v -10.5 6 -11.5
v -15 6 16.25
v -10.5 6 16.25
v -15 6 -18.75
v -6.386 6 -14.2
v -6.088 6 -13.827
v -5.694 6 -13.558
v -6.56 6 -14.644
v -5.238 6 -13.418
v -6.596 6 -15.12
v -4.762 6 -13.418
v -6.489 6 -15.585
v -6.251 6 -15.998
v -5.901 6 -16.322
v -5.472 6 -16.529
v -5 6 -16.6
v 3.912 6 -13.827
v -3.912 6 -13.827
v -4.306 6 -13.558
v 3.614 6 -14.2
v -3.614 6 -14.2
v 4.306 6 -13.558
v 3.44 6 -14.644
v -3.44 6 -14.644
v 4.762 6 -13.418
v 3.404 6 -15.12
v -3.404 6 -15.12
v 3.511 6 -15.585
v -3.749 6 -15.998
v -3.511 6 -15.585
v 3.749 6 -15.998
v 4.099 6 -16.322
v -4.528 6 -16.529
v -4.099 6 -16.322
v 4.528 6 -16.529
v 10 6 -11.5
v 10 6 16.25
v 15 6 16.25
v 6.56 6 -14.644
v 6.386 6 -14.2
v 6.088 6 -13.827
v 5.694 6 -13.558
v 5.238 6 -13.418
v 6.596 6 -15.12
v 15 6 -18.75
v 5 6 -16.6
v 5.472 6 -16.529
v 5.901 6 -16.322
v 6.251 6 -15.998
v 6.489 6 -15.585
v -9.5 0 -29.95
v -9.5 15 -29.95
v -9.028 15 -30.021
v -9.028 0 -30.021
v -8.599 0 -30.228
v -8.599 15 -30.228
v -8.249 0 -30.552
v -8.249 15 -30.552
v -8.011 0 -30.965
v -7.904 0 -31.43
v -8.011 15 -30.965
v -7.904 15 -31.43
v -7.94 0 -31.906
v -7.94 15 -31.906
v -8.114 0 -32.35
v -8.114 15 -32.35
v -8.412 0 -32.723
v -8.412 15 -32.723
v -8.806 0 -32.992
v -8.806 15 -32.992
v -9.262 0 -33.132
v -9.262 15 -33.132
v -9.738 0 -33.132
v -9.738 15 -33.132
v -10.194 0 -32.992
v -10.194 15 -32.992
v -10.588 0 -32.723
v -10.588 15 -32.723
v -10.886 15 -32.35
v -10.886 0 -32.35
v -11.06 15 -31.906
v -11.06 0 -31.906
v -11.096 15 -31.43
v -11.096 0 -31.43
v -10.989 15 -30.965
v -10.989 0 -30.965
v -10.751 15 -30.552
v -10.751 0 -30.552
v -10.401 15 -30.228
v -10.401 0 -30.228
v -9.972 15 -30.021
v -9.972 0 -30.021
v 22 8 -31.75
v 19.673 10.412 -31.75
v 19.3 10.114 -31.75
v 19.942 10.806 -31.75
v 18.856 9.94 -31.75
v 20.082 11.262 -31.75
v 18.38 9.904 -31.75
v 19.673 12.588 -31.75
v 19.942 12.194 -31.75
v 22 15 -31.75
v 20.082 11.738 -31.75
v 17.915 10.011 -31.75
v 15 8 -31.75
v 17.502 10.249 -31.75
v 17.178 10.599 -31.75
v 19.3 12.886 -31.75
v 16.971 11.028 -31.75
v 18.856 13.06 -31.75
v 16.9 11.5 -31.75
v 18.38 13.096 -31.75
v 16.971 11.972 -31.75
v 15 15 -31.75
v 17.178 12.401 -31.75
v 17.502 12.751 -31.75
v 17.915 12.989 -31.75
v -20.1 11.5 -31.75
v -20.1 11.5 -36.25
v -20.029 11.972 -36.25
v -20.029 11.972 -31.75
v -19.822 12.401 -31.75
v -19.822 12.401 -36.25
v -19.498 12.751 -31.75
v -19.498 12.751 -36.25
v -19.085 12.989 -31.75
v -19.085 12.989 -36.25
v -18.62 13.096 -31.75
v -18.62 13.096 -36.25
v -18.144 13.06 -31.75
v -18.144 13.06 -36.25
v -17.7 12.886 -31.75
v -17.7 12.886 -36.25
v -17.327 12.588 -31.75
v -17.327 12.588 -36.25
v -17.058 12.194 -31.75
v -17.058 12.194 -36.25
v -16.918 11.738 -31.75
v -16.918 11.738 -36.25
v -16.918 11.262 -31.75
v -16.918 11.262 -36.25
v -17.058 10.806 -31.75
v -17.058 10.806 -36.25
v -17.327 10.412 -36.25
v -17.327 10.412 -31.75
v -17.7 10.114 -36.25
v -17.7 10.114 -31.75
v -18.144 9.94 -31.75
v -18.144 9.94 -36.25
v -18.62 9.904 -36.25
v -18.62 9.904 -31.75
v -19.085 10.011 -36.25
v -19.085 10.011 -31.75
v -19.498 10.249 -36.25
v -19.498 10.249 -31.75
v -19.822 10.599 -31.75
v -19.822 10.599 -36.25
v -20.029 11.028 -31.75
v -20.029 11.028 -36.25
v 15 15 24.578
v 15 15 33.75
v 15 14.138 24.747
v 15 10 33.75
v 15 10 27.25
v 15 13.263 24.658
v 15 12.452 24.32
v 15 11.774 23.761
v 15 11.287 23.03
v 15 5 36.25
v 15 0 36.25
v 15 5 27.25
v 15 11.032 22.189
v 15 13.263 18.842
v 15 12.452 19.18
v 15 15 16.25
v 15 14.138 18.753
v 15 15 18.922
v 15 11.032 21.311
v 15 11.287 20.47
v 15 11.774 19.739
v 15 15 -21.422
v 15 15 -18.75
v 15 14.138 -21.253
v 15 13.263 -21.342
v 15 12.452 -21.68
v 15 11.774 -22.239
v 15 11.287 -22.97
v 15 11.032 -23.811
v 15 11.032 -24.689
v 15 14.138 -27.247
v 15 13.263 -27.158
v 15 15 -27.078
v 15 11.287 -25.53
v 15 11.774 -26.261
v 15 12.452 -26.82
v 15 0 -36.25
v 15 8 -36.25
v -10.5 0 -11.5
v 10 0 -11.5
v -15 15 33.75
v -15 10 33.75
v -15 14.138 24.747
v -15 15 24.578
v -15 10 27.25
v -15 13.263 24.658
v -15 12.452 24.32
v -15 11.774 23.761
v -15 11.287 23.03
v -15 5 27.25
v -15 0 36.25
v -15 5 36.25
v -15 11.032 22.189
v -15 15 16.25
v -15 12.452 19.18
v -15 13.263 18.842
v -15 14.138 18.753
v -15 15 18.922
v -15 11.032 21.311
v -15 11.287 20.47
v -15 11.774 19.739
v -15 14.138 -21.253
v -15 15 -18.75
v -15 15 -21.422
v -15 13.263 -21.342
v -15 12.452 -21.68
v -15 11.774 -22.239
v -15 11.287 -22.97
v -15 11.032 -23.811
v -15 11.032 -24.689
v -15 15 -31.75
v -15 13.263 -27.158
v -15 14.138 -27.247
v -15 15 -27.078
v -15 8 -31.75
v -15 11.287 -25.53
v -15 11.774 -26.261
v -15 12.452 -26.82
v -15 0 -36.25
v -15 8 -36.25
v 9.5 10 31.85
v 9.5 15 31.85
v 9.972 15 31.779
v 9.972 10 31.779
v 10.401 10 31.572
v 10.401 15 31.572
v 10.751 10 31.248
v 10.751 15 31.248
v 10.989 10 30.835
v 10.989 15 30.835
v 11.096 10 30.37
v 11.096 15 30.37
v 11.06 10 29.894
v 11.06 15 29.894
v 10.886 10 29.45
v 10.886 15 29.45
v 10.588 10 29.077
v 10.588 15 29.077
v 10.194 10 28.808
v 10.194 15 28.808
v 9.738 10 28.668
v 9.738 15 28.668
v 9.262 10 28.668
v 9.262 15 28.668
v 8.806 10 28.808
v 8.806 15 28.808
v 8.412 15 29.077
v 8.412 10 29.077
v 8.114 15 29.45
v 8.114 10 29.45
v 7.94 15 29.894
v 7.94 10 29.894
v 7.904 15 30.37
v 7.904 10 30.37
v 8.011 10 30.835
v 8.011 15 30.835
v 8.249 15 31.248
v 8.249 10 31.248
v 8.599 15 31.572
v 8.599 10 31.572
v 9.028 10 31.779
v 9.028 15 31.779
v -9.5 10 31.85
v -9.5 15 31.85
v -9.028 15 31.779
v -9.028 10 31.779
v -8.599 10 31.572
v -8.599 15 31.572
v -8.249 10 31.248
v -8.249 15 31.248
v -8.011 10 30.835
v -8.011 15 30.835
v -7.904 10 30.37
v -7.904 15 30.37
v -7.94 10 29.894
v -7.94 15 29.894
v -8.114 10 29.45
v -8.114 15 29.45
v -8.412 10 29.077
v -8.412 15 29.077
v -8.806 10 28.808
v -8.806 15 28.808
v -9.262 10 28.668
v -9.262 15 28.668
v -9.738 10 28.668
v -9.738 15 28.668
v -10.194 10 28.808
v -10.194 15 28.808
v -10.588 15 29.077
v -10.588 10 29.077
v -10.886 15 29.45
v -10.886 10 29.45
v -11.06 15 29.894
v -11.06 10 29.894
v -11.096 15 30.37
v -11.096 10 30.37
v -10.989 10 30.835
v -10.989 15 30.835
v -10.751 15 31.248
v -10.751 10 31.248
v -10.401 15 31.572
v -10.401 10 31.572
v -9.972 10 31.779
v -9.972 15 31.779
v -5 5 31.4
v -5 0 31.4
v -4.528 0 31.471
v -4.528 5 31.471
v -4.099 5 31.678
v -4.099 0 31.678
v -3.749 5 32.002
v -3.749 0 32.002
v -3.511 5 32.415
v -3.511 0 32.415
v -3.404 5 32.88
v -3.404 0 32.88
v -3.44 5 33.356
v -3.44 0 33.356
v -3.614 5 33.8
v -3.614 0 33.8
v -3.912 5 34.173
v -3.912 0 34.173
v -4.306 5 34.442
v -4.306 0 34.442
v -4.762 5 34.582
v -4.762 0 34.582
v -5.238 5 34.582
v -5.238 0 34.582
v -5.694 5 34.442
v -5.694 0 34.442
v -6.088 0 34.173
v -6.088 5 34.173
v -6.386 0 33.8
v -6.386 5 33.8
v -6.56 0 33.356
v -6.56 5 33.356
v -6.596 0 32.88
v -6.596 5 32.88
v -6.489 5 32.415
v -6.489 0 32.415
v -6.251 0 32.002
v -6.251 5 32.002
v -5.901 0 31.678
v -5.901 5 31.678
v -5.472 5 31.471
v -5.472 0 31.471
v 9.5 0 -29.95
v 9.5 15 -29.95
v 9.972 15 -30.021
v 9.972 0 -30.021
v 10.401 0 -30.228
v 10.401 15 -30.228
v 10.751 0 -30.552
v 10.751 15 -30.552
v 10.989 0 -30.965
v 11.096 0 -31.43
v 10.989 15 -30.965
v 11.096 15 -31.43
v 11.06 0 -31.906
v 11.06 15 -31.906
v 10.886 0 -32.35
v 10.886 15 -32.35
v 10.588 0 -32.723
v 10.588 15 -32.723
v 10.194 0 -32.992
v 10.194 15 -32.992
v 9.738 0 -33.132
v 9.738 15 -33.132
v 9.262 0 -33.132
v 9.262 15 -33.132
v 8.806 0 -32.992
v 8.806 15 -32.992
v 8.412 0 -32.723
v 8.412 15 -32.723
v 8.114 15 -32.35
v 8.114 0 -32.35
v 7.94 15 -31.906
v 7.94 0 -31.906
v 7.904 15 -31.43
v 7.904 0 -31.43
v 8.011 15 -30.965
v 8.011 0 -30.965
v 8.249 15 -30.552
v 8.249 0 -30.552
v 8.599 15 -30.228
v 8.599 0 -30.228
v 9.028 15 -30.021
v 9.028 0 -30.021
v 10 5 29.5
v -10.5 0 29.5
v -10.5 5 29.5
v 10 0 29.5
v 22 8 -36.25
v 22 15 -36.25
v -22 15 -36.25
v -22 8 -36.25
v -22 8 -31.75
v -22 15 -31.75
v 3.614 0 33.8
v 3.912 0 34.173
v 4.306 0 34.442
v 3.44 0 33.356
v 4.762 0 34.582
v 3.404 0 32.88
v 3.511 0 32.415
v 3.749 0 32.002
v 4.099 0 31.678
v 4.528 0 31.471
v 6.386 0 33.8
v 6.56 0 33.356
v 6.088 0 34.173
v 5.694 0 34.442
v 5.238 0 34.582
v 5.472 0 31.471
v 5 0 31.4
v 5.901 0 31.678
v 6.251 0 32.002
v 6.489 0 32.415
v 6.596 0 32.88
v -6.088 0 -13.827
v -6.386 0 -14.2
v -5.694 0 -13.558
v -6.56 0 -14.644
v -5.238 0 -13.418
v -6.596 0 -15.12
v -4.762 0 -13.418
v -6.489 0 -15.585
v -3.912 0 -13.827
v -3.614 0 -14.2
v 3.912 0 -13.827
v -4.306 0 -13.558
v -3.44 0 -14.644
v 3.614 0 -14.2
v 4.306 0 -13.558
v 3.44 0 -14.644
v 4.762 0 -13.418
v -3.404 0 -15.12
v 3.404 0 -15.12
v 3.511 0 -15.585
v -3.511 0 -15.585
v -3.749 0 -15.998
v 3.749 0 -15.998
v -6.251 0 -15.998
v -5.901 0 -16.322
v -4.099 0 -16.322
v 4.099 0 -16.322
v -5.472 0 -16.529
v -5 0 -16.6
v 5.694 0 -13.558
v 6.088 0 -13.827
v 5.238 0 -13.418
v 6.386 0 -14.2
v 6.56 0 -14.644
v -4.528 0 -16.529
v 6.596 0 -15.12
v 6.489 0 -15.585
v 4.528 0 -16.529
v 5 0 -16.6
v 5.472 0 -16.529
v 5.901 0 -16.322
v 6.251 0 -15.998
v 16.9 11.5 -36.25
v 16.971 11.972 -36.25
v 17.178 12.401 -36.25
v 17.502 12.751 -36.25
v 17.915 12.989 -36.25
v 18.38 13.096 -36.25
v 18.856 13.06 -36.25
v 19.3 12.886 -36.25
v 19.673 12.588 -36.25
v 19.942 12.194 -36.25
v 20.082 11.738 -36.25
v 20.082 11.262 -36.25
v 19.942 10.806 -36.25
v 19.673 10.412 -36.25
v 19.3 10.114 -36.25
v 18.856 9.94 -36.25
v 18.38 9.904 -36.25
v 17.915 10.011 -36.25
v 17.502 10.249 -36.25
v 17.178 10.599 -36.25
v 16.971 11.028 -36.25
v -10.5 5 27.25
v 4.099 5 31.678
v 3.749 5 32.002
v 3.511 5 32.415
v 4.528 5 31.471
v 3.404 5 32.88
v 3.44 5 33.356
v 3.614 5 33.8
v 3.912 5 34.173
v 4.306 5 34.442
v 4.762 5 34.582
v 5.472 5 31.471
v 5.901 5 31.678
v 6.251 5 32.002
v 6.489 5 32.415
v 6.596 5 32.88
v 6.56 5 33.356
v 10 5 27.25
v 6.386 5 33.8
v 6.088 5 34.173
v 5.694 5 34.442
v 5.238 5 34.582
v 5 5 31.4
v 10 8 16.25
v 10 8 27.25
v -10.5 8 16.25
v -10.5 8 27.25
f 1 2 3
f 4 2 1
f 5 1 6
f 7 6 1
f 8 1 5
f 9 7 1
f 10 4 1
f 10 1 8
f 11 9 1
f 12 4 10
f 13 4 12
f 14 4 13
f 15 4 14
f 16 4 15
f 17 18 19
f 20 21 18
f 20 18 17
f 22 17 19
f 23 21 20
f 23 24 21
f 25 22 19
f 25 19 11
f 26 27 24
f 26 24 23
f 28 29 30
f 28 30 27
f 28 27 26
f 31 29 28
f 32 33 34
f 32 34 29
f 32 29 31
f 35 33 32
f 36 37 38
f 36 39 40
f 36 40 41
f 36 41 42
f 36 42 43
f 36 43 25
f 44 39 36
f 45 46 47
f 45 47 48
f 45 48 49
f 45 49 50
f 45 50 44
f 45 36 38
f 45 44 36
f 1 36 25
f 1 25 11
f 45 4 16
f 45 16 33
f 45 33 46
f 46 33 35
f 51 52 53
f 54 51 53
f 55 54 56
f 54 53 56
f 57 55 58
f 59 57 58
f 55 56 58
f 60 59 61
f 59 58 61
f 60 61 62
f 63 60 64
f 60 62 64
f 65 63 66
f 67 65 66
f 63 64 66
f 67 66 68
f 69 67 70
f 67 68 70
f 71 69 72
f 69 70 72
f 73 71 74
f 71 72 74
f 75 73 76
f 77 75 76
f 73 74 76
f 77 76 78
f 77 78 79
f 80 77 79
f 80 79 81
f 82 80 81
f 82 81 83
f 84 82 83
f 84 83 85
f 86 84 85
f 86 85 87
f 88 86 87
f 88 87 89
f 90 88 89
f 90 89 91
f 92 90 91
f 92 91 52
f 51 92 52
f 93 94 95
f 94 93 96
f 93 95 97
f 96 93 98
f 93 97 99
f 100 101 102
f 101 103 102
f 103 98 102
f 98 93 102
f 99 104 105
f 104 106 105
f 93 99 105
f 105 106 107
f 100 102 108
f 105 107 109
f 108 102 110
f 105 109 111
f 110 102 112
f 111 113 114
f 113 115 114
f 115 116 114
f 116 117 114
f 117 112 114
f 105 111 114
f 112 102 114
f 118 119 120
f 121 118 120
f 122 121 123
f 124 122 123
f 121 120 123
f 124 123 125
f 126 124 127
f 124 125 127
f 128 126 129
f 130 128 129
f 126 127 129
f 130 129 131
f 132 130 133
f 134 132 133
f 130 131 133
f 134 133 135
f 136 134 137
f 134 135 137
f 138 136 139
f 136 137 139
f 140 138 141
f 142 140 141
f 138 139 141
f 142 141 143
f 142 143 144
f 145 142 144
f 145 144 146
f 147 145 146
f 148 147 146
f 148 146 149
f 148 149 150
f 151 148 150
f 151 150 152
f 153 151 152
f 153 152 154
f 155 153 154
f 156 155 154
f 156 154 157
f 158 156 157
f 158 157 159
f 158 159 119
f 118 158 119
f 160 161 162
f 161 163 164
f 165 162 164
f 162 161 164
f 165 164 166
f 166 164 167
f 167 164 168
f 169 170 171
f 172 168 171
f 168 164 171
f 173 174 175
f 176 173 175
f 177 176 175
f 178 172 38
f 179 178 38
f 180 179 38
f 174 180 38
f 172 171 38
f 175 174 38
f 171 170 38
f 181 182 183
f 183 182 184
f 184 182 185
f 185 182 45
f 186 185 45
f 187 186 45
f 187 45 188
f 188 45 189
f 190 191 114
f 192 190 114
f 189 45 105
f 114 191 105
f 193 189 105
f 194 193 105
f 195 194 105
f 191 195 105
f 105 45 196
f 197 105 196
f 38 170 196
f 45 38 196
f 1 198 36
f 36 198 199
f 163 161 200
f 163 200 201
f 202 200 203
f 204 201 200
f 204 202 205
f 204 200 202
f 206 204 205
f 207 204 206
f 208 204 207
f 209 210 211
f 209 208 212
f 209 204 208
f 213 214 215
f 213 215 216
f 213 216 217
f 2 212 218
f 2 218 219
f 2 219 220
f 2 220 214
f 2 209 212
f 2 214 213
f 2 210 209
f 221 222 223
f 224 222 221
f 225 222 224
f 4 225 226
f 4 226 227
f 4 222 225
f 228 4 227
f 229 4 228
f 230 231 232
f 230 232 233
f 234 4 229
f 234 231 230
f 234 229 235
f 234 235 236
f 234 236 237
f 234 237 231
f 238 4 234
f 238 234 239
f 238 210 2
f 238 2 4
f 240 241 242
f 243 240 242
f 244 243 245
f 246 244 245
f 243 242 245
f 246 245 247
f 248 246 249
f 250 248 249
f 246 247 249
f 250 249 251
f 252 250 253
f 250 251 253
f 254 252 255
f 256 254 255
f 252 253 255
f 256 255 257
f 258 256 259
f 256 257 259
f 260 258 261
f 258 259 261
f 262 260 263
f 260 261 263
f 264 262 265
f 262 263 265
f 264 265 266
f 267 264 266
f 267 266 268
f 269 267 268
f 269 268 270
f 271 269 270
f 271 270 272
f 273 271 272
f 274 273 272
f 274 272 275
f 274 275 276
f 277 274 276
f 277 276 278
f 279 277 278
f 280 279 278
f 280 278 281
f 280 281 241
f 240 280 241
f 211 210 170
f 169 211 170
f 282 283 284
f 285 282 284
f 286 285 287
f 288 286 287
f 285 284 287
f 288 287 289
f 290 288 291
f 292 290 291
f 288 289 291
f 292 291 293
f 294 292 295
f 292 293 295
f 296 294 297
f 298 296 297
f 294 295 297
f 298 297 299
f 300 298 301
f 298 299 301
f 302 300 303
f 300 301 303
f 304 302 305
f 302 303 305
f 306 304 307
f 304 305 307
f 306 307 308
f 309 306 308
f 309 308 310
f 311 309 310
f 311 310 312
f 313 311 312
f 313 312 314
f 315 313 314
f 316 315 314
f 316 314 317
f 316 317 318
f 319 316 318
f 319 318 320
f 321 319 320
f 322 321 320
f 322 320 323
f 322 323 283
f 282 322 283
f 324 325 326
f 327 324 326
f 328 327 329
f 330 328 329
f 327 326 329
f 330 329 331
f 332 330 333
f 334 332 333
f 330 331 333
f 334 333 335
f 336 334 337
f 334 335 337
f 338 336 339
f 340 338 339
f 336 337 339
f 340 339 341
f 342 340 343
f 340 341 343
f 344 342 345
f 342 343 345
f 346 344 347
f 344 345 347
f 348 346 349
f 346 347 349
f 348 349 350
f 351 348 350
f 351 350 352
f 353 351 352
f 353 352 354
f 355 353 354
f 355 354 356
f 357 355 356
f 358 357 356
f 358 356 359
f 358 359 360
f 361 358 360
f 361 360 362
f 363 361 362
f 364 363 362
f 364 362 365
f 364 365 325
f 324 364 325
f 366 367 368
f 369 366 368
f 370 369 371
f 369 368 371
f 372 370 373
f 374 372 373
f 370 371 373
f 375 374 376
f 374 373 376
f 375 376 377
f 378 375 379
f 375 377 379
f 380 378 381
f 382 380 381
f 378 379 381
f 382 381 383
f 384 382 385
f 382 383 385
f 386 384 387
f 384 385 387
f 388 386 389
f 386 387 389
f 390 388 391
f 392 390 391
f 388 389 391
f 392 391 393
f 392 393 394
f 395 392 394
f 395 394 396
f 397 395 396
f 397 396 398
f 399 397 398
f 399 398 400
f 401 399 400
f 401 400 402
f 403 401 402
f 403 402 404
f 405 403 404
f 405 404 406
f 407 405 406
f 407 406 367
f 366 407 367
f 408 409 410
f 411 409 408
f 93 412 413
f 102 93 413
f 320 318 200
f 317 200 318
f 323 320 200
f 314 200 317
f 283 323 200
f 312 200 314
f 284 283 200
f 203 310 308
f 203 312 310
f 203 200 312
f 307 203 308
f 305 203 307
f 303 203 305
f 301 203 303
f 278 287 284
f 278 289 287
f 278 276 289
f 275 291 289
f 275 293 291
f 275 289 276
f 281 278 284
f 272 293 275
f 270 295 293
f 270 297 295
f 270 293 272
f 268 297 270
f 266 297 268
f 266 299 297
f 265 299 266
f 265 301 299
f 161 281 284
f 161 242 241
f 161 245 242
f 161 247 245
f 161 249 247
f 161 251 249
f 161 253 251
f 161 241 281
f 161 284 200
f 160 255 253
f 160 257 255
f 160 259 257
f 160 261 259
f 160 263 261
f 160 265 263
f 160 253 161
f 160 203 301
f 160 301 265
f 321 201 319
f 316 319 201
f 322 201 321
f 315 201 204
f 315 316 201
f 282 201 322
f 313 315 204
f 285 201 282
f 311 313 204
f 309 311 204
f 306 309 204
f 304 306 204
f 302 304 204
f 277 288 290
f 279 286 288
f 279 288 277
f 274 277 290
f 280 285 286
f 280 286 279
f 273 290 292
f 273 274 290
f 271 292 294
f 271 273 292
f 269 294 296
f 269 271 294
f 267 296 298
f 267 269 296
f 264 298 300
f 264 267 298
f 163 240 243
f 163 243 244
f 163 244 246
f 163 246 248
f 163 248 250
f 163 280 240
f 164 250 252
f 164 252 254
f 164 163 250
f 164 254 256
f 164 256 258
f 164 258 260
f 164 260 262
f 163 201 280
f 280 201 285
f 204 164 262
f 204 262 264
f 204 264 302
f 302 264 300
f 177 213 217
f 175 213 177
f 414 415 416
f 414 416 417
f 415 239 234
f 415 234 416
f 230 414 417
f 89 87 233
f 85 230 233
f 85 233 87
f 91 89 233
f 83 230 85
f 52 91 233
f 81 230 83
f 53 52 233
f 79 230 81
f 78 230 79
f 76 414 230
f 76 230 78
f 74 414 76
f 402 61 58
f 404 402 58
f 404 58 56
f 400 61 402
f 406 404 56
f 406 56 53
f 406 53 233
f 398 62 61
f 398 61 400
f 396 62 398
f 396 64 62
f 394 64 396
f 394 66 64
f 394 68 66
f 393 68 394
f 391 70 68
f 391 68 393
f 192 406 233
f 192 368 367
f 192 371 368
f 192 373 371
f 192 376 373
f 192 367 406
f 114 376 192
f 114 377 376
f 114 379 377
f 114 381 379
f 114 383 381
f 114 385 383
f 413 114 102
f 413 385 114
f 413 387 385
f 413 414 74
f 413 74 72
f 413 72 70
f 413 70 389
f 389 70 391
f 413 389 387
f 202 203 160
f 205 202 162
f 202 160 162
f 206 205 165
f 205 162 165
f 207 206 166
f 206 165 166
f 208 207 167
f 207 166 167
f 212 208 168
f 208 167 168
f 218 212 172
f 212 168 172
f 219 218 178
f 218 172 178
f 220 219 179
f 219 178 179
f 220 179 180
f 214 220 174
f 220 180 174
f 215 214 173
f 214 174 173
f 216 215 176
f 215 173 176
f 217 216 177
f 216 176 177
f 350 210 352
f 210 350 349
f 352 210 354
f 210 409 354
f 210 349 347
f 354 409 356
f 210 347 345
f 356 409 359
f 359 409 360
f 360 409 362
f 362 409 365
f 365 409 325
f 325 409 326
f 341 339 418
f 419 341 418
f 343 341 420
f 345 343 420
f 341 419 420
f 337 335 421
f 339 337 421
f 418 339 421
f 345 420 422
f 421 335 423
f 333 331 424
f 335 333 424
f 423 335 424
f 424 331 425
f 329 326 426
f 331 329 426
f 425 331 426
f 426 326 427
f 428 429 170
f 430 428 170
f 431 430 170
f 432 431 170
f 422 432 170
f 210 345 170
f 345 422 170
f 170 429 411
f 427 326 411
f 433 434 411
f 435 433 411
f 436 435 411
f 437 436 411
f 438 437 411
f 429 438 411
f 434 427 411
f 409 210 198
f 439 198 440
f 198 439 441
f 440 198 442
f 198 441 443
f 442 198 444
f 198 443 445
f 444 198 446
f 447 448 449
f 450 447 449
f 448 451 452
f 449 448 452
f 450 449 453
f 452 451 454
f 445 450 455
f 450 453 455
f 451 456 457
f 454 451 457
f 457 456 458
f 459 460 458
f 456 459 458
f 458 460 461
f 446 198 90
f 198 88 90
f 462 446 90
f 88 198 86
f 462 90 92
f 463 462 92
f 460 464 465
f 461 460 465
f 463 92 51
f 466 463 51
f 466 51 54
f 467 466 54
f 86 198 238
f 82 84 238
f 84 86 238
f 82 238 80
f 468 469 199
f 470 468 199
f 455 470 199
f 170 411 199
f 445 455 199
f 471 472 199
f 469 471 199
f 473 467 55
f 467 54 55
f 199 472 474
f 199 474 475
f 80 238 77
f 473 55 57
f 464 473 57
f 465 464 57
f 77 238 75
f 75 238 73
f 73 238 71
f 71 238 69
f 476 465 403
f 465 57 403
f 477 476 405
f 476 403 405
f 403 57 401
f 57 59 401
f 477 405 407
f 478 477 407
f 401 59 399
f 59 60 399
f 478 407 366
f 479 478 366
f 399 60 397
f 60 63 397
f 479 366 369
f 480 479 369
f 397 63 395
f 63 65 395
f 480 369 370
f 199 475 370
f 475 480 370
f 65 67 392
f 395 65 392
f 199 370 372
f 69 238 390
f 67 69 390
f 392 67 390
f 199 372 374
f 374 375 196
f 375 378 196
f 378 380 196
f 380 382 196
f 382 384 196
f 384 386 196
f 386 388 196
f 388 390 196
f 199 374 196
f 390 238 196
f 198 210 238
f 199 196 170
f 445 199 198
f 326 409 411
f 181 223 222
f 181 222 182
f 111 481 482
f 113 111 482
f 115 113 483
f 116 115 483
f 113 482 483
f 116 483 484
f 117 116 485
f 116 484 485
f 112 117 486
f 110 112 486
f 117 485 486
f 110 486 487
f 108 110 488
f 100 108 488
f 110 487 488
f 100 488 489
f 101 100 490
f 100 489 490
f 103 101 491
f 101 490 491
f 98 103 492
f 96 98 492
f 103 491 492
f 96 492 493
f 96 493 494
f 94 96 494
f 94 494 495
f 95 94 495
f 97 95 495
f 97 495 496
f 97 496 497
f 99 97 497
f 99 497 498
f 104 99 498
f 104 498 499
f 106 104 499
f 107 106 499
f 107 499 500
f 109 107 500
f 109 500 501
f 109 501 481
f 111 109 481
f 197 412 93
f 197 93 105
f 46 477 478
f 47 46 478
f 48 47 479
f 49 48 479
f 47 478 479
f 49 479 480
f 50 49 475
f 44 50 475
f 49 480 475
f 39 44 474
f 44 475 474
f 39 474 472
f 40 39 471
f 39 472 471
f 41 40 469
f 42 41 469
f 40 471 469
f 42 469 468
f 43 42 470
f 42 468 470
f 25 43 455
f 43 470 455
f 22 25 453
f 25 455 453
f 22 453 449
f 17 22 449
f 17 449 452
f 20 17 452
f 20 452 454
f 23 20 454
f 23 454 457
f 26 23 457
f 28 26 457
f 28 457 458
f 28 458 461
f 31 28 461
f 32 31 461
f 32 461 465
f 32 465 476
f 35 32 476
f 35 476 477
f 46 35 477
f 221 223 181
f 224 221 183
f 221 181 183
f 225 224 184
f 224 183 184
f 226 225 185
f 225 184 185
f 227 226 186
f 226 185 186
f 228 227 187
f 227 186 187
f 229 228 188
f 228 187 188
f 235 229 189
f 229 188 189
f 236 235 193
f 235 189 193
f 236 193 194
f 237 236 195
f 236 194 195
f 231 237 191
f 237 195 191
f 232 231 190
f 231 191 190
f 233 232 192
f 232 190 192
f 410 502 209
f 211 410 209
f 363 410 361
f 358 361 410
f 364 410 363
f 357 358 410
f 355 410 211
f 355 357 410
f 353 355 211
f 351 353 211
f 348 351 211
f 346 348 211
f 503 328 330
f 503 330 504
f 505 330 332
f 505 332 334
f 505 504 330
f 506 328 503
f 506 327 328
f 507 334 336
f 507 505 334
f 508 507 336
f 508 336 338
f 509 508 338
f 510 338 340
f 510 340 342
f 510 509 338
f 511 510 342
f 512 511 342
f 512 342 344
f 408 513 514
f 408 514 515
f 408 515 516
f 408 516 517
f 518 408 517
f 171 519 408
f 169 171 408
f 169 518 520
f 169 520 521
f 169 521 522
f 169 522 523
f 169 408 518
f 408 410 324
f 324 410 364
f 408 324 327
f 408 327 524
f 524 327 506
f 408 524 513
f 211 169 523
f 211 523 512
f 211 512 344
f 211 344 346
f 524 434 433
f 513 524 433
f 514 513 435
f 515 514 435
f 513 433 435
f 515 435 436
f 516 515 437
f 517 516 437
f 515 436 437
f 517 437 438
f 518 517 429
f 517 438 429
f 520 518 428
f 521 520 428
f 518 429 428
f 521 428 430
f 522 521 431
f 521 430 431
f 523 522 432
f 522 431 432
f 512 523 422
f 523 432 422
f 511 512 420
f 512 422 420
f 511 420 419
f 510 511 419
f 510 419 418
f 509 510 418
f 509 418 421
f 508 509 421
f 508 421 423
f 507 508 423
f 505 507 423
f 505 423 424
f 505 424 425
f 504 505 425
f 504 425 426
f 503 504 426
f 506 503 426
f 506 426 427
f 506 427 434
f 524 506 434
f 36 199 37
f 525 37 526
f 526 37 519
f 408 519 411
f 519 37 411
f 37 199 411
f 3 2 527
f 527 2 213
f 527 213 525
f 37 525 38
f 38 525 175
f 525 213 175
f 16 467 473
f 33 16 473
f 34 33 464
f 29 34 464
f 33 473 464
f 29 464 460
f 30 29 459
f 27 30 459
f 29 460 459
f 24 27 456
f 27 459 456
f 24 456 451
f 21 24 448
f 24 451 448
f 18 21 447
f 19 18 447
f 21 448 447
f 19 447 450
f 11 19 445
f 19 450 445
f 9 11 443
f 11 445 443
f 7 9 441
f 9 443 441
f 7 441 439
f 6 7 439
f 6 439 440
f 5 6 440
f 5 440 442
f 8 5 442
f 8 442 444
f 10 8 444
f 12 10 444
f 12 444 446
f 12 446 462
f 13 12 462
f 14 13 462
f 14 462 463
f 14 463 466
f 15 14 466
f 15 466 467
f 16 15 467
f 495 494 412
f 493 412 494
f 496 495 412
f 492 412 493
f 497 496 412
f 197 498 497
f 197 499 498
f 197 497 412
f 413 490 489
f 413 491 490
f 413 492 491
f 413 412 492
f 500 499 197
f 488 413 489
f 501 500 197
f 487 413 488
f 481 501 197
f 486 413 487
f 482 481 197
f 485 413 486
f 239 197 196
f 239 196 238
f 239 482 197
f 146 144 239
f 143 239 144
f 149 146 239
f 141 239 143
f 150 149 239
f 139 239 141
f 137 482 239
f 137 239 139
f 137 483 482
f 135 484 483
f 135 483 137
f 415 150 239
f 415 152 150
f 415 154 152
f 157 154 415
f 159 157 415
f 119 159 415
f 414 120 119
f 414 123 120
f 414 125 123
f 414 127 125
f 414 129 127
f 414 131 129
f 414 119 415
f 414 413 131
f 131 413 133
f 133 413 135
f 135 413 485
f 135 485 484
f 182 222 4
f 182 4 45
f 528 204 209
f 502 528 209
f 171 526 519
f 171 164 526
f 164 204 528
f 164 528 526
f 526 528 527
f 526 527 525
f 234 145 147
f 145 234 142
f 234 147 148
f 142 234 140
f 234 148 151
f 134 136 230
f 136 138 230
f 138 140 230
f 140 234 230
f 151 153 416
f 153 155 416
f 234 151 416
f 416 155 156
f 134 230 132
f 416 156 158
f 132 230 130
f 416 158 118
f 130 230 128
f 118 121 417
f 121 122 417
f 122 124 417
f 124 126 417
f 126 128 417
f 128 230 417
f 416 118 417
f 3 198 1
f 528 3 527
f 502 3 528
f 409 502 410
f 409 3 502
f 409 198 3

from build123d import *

# Parameters (mm, degrees)
SKETCH1_W           = 30
SKETCH1_H           = 72.5
BOSS_EXTRUDE1_DEPTH = 15
SKETCH2_W           = 20.5
SKETCH2_H           = 41
CUT_EXTRUDE1_DEPTH  = 8
SKETCH3_W           = 30
SKETCH3_H           = 35
CUT_EXTRUDE2_DEPTH  = 9
CUT_EXTRUDE3_DEPTH  = 50.386865663
CUT_EXTRUDE4_REACH  = 44.001
SKETCH5_R           = 1.6
SKETCH6_R           = 3
CUT_EXTRUDE5_DEPTH  = 50.386865663
CUT_EXTRUDE6_REACH  = 44.001
SKETCH7_R           = 1.6
SKETCH8_W           = 7
SKETCH8_H           = 7
BOSS_EXTRUDE2_DEPTH = 4.5
CUT_EXTRUDE7_REACH  = 79.235
SKETCH9_R           = 1.6


with BuildPart() as part:
    # Sketch1 → Boss-Extrude1 (new body)
    with BuildSketch(Plane(origin=(0, 0, 0), x_dir=(1, 0, 0), z_dir=(0, 1, 0))):
        Rectangle(SKETCH1_W, SKETCH1_H)
    extrude(amount=BOSS_EXTRUDE1_DEPTH)

    # Sketch2 → Cut-Extrude1 (cut)
    with BuildSketch(Plane.XZ):
        with Locations((-0.25, 9)):
            Rectangle(SKETCH2_W, SKETCH2_H)
    extrude(amount=-CUT_EXTRUDE1_DEPTH, mode=Mode.SUBTRACT)

    # Sketch3 → Cut-Extrude2 (cut)
    with BuildSketch(Plane(origin=(0, 15, 0), x_dir=(1, 0, 0), z_dir=(0, 1, 0))):
        with Locations((0, 1.25)):
            Rectangle(SKETCH3_W, SKETCH3_H)
    extrude(amount=-CUT_EXTRUDE2_DEPTH, mode=Mode.SUBTRACT)

    # Sketch4 → Cut-Extrude3 (cut, through all)
    with BuildSketch(Plane(origin=(15, 0, 0), x_dir=(0, 0, -1), z_dir=(1, 0, 0))):
        Polygon((-33.75, 15), (-33.75, 10), (-27.25, 10), (-27.25, 5), (-36.25, 5), (-36.25, 15), align=None)
    extrude(amount=-CUT_EXTRUDE3_DEPTH, mode=Mode.SUBTRACT)

    # Sketch5 → Cut-Extrude4 (cut, up to next)
    with BuildSketch(Plane.XZ, mode=Mode.PRIVATE) as cut_extrude4_sk1:
        with Locations(Location((-5, 33, 0), (0, 0, 270))):
            Circle(SKETCH5_R)
    cut_extrude4_tool1 = extrude(cut_extrude4_sk1.sketch, amount=-CUT_EXTRUDE4_REACH, mode=Mode.PRIVATE) & part.part
    # Sketch5 → Cut-Extrude4 (cut, up to next)
    with BuildSketch(Plane.XZ, mode=Mode.PRIVATE) as cut_extrude4_sk2:
        with Locations(Location((5, 33, 0), (0, 0, 270))):
            Circle(SKETCH5_R)
    cut_extrude4_tool2 = extrude(cut_extrude4_sk2.sketch, amount=-CUT_EXTRUDE4_REACH, mode=Mode.PRIVATE) & part.part
    # Sketch5 → Cut-Extrude4 (cut, up to next)
    with BuildSketch(Plane.XZ, mode=Mode.PRIVATE) as cut_extrude4_sk3:
        with Locations(Location((-5, -15, 0), (0, 0, 270))):
            Circle(SKETCH5_R)
    cut_extrude4_tool3 = extrude(cut_extrude4_sk3.sketch, amount=-CUT_EXTRUDE4_REACH, mode=Mode.PRIVATE) & part.part
    # Sketch5 → Cut-Extrude4 (cut, up to next)
    with BuildSketch(Plane.XZ, mode=Mode.PRIVATE) as cut_extrude4_sk4:
        with Locations(Location((5, -15, 0), (0, 0, 270))):
            Circle(SKETCH5_R)
    cut_extrude4_tool4 = extrude(cut_extrude4_sk4.sketch, amount=-CUT_EXTRUDE4_REACH, mode=Mode.PRIVATE) & part.part
    add(cut_extrude4_tool1.solids().sort_by_distance((-5, 0, 33))[0], mode=Mode.SUBTRACT)
    add(cut_extrude4_tool2.solids().sort_by_distance((5, 0, 33))[0], mode=Mode.SUBTRACT)
    add(cut_extrude4_tool3.solids().sort_by_distance((-5, 0, -15))[0], mode=Mode.SUBTRACT)
    add(cut_extrude4_tool4.solids().sort_by_distance((5, 0, -15))[0], mode=Mode.SUBTRACT)

    # Sketch6 → Cut-Extrude5 (cut, through all)
    with BuildSketch(Plane(origin=(15, 0, 0), x_dir=(0, 0, -1), z_dir=(1, 0, 0))):
        with Locations((24.25, 14)):
            Circle(SKETCH6_R)
        with Locations((-21.75, 14)):
            Circle(SKETCH6_R)
    extrude(amount=-CUT_EXTRUDE5_DEPTH, mode=Mode.SUBTRACT)

    # Sketch7 → Cut-Extrude6 (cut, up to next)
    with BuildSketch(Plane(origin=(0, 15, 0), x_dir=(1, 0, 0), z_dir=(0, 1, 0)), mode=Mode.PRIVATE) as cut_extrude6_sk1:
        with Locations(Location((-9.5, -30.25, 0), (0, 0, 270))):
            Circle(SKETCH7_R)
    cut_extrude6_tool1 = extrude(cut_extrude6_sk1.sketch, amount=-CUT_EXTRUDE6_REACH, mode=Mode.PRIVATE) & part.part
    # Sketch7 → Cut-Extrude6 (cut, up to next)
    with BuildSketch(Plane(origin=(0, 15, 0), x_dir=(1, 0, 0), z_dir=(0, 1, 0)), mode=Mode.PRIVATE) as cut_extrude6_sk2:
        with Locations(Location((9.5, -30.25, 0), (0, 0, 270))):
            Circle(SKETCH7_R)
    cut_extrude6_tool2 = extrude(cut_extrude6_sk2.sketch, amount=-CUT_EXTRUDE6_REACH, mode=Mode.PRIVATE) & part.part
    # Sketch7 → Cut-Extrude6 (cut, up to next)
    with BuildSketch(Plane(origin=(0, 15, 0), x_dir=(1, 0, 0), z_dir=(0, 1, 0)), mode=Mode.PRIVATE) as cut_extrude6_sk3:
        with Locations(Location((-9.5, 31.55, 0), (0, 0, 270))):
            Circle(SKETCH7_R)
    cut_extrude6_tool3 = extrude(cut_extrude6_sk3.sketch, amount=-CUT_EXTRUDE6_REACH, mode=Mode.PRIVATE) & part.part
    # Sketch7 → Cut-Extrude6 (cut, up to next)
    with BuildSketch(Plane(origin=(0, 15, 0), x_dir=(1, 0, 0), z_dir=(0, 1, 0)), mode=Mode.PRIVATE) as cut_extrude6_sk4:
        with Locations(Location((9.5, 31.55, 0), (0, 0, 270))):
            Circle(SKETCH7_R)
    cut_extrude6_tool4 = extrude(cut_extrude6_sk4.sketch, amount=-CUT_EXTRUDE6_REACH, mode=Mode.PRIVATE) & part.part
    add(cut_extrude6_tool1.solids().sort_by_distance((-9.5, 15, 30.25))[0], mode=Mode.SUBTRACT)
    add(cut_extrude6_tool2.solids().sort_by_distance((9.5, 15, 30.25))[0], mode=Mode.SUBTRACT)
    add(cut_extrude6_tool3.solids().sort_by_distance((-9.5, 15, -31.55))[0], mode=Mode.SUBTRACT)
    add(cut_extrude6_tool4.solids().sort_by_distance((9.5, 15, -31.55))[0], mode=Mode.SUBTRACT)

    # Sketch8 → Boss-Extrude2 (add)
    with BuildSketch(Plane(origin=(0, 0, -36.25), x_dir=(-1, 0, 0), z_dir=(0, 0, -1))):
        with Locations((18.5, 11.5)):
            Rectangle(SKETCH8_W, SKETCH8_H)
        with Locations((-18.5, 11.5)):
            Rectangle(SKETCH8_W, SKETCH8_H)
    extrude(amount=-BOSS_EXTRUDE2_DEPTH)

    # Sketch9 → Cut-Extrude7 (cut, up to next)
    with BuildSketch(Plane(origin=(0, 0, -36.25), x_dir=(-1, 0, 0), z_dir=(0, 0, -1)), mode=Mode.PRIVATE) as cut_extrude7_sk1:
        with Locations((18.5, 11.5)):
            Circle(SKETCH9_R)
    cut_extrude7_tool1 = extrude(cut_extrude7_sk1.sketch, amount=-CUT_EXTRUDE7_REACH, mode=Mode.PRIVATE) & part.part
    # Sketch9 → Cut-Extrude7 (cut, up to next)
    with BuildSketch(Plane(origin=(0, 0, -36.25), x_dir=(-1, 0, 0), z_dir=(0, 0, -1)), mode=Mode.PRIVATE) as cut_extrude7_sk2:
        with Locations((-18.5, 11.5)):
            Circle(SKETCH9_R)
    cut_extrude7_tool2 = extrude(cut_extrude7_sk2.sketch, amount=-CUT_EXTRUDE7_REACH, mode=Mode.PRIVATE) & part.part
    add(cut_extrude7_tool1.solids().sort_by_distance((-18.5, 11.5, -36.25))[0], mode=Mode.SUBTRACT)
    add(cut_extrude7_tool2.solids().sort_by_distance((18.5, 11.5, -36.25))[0], mode=Mode.SUBTRACT)


solid = part.part
